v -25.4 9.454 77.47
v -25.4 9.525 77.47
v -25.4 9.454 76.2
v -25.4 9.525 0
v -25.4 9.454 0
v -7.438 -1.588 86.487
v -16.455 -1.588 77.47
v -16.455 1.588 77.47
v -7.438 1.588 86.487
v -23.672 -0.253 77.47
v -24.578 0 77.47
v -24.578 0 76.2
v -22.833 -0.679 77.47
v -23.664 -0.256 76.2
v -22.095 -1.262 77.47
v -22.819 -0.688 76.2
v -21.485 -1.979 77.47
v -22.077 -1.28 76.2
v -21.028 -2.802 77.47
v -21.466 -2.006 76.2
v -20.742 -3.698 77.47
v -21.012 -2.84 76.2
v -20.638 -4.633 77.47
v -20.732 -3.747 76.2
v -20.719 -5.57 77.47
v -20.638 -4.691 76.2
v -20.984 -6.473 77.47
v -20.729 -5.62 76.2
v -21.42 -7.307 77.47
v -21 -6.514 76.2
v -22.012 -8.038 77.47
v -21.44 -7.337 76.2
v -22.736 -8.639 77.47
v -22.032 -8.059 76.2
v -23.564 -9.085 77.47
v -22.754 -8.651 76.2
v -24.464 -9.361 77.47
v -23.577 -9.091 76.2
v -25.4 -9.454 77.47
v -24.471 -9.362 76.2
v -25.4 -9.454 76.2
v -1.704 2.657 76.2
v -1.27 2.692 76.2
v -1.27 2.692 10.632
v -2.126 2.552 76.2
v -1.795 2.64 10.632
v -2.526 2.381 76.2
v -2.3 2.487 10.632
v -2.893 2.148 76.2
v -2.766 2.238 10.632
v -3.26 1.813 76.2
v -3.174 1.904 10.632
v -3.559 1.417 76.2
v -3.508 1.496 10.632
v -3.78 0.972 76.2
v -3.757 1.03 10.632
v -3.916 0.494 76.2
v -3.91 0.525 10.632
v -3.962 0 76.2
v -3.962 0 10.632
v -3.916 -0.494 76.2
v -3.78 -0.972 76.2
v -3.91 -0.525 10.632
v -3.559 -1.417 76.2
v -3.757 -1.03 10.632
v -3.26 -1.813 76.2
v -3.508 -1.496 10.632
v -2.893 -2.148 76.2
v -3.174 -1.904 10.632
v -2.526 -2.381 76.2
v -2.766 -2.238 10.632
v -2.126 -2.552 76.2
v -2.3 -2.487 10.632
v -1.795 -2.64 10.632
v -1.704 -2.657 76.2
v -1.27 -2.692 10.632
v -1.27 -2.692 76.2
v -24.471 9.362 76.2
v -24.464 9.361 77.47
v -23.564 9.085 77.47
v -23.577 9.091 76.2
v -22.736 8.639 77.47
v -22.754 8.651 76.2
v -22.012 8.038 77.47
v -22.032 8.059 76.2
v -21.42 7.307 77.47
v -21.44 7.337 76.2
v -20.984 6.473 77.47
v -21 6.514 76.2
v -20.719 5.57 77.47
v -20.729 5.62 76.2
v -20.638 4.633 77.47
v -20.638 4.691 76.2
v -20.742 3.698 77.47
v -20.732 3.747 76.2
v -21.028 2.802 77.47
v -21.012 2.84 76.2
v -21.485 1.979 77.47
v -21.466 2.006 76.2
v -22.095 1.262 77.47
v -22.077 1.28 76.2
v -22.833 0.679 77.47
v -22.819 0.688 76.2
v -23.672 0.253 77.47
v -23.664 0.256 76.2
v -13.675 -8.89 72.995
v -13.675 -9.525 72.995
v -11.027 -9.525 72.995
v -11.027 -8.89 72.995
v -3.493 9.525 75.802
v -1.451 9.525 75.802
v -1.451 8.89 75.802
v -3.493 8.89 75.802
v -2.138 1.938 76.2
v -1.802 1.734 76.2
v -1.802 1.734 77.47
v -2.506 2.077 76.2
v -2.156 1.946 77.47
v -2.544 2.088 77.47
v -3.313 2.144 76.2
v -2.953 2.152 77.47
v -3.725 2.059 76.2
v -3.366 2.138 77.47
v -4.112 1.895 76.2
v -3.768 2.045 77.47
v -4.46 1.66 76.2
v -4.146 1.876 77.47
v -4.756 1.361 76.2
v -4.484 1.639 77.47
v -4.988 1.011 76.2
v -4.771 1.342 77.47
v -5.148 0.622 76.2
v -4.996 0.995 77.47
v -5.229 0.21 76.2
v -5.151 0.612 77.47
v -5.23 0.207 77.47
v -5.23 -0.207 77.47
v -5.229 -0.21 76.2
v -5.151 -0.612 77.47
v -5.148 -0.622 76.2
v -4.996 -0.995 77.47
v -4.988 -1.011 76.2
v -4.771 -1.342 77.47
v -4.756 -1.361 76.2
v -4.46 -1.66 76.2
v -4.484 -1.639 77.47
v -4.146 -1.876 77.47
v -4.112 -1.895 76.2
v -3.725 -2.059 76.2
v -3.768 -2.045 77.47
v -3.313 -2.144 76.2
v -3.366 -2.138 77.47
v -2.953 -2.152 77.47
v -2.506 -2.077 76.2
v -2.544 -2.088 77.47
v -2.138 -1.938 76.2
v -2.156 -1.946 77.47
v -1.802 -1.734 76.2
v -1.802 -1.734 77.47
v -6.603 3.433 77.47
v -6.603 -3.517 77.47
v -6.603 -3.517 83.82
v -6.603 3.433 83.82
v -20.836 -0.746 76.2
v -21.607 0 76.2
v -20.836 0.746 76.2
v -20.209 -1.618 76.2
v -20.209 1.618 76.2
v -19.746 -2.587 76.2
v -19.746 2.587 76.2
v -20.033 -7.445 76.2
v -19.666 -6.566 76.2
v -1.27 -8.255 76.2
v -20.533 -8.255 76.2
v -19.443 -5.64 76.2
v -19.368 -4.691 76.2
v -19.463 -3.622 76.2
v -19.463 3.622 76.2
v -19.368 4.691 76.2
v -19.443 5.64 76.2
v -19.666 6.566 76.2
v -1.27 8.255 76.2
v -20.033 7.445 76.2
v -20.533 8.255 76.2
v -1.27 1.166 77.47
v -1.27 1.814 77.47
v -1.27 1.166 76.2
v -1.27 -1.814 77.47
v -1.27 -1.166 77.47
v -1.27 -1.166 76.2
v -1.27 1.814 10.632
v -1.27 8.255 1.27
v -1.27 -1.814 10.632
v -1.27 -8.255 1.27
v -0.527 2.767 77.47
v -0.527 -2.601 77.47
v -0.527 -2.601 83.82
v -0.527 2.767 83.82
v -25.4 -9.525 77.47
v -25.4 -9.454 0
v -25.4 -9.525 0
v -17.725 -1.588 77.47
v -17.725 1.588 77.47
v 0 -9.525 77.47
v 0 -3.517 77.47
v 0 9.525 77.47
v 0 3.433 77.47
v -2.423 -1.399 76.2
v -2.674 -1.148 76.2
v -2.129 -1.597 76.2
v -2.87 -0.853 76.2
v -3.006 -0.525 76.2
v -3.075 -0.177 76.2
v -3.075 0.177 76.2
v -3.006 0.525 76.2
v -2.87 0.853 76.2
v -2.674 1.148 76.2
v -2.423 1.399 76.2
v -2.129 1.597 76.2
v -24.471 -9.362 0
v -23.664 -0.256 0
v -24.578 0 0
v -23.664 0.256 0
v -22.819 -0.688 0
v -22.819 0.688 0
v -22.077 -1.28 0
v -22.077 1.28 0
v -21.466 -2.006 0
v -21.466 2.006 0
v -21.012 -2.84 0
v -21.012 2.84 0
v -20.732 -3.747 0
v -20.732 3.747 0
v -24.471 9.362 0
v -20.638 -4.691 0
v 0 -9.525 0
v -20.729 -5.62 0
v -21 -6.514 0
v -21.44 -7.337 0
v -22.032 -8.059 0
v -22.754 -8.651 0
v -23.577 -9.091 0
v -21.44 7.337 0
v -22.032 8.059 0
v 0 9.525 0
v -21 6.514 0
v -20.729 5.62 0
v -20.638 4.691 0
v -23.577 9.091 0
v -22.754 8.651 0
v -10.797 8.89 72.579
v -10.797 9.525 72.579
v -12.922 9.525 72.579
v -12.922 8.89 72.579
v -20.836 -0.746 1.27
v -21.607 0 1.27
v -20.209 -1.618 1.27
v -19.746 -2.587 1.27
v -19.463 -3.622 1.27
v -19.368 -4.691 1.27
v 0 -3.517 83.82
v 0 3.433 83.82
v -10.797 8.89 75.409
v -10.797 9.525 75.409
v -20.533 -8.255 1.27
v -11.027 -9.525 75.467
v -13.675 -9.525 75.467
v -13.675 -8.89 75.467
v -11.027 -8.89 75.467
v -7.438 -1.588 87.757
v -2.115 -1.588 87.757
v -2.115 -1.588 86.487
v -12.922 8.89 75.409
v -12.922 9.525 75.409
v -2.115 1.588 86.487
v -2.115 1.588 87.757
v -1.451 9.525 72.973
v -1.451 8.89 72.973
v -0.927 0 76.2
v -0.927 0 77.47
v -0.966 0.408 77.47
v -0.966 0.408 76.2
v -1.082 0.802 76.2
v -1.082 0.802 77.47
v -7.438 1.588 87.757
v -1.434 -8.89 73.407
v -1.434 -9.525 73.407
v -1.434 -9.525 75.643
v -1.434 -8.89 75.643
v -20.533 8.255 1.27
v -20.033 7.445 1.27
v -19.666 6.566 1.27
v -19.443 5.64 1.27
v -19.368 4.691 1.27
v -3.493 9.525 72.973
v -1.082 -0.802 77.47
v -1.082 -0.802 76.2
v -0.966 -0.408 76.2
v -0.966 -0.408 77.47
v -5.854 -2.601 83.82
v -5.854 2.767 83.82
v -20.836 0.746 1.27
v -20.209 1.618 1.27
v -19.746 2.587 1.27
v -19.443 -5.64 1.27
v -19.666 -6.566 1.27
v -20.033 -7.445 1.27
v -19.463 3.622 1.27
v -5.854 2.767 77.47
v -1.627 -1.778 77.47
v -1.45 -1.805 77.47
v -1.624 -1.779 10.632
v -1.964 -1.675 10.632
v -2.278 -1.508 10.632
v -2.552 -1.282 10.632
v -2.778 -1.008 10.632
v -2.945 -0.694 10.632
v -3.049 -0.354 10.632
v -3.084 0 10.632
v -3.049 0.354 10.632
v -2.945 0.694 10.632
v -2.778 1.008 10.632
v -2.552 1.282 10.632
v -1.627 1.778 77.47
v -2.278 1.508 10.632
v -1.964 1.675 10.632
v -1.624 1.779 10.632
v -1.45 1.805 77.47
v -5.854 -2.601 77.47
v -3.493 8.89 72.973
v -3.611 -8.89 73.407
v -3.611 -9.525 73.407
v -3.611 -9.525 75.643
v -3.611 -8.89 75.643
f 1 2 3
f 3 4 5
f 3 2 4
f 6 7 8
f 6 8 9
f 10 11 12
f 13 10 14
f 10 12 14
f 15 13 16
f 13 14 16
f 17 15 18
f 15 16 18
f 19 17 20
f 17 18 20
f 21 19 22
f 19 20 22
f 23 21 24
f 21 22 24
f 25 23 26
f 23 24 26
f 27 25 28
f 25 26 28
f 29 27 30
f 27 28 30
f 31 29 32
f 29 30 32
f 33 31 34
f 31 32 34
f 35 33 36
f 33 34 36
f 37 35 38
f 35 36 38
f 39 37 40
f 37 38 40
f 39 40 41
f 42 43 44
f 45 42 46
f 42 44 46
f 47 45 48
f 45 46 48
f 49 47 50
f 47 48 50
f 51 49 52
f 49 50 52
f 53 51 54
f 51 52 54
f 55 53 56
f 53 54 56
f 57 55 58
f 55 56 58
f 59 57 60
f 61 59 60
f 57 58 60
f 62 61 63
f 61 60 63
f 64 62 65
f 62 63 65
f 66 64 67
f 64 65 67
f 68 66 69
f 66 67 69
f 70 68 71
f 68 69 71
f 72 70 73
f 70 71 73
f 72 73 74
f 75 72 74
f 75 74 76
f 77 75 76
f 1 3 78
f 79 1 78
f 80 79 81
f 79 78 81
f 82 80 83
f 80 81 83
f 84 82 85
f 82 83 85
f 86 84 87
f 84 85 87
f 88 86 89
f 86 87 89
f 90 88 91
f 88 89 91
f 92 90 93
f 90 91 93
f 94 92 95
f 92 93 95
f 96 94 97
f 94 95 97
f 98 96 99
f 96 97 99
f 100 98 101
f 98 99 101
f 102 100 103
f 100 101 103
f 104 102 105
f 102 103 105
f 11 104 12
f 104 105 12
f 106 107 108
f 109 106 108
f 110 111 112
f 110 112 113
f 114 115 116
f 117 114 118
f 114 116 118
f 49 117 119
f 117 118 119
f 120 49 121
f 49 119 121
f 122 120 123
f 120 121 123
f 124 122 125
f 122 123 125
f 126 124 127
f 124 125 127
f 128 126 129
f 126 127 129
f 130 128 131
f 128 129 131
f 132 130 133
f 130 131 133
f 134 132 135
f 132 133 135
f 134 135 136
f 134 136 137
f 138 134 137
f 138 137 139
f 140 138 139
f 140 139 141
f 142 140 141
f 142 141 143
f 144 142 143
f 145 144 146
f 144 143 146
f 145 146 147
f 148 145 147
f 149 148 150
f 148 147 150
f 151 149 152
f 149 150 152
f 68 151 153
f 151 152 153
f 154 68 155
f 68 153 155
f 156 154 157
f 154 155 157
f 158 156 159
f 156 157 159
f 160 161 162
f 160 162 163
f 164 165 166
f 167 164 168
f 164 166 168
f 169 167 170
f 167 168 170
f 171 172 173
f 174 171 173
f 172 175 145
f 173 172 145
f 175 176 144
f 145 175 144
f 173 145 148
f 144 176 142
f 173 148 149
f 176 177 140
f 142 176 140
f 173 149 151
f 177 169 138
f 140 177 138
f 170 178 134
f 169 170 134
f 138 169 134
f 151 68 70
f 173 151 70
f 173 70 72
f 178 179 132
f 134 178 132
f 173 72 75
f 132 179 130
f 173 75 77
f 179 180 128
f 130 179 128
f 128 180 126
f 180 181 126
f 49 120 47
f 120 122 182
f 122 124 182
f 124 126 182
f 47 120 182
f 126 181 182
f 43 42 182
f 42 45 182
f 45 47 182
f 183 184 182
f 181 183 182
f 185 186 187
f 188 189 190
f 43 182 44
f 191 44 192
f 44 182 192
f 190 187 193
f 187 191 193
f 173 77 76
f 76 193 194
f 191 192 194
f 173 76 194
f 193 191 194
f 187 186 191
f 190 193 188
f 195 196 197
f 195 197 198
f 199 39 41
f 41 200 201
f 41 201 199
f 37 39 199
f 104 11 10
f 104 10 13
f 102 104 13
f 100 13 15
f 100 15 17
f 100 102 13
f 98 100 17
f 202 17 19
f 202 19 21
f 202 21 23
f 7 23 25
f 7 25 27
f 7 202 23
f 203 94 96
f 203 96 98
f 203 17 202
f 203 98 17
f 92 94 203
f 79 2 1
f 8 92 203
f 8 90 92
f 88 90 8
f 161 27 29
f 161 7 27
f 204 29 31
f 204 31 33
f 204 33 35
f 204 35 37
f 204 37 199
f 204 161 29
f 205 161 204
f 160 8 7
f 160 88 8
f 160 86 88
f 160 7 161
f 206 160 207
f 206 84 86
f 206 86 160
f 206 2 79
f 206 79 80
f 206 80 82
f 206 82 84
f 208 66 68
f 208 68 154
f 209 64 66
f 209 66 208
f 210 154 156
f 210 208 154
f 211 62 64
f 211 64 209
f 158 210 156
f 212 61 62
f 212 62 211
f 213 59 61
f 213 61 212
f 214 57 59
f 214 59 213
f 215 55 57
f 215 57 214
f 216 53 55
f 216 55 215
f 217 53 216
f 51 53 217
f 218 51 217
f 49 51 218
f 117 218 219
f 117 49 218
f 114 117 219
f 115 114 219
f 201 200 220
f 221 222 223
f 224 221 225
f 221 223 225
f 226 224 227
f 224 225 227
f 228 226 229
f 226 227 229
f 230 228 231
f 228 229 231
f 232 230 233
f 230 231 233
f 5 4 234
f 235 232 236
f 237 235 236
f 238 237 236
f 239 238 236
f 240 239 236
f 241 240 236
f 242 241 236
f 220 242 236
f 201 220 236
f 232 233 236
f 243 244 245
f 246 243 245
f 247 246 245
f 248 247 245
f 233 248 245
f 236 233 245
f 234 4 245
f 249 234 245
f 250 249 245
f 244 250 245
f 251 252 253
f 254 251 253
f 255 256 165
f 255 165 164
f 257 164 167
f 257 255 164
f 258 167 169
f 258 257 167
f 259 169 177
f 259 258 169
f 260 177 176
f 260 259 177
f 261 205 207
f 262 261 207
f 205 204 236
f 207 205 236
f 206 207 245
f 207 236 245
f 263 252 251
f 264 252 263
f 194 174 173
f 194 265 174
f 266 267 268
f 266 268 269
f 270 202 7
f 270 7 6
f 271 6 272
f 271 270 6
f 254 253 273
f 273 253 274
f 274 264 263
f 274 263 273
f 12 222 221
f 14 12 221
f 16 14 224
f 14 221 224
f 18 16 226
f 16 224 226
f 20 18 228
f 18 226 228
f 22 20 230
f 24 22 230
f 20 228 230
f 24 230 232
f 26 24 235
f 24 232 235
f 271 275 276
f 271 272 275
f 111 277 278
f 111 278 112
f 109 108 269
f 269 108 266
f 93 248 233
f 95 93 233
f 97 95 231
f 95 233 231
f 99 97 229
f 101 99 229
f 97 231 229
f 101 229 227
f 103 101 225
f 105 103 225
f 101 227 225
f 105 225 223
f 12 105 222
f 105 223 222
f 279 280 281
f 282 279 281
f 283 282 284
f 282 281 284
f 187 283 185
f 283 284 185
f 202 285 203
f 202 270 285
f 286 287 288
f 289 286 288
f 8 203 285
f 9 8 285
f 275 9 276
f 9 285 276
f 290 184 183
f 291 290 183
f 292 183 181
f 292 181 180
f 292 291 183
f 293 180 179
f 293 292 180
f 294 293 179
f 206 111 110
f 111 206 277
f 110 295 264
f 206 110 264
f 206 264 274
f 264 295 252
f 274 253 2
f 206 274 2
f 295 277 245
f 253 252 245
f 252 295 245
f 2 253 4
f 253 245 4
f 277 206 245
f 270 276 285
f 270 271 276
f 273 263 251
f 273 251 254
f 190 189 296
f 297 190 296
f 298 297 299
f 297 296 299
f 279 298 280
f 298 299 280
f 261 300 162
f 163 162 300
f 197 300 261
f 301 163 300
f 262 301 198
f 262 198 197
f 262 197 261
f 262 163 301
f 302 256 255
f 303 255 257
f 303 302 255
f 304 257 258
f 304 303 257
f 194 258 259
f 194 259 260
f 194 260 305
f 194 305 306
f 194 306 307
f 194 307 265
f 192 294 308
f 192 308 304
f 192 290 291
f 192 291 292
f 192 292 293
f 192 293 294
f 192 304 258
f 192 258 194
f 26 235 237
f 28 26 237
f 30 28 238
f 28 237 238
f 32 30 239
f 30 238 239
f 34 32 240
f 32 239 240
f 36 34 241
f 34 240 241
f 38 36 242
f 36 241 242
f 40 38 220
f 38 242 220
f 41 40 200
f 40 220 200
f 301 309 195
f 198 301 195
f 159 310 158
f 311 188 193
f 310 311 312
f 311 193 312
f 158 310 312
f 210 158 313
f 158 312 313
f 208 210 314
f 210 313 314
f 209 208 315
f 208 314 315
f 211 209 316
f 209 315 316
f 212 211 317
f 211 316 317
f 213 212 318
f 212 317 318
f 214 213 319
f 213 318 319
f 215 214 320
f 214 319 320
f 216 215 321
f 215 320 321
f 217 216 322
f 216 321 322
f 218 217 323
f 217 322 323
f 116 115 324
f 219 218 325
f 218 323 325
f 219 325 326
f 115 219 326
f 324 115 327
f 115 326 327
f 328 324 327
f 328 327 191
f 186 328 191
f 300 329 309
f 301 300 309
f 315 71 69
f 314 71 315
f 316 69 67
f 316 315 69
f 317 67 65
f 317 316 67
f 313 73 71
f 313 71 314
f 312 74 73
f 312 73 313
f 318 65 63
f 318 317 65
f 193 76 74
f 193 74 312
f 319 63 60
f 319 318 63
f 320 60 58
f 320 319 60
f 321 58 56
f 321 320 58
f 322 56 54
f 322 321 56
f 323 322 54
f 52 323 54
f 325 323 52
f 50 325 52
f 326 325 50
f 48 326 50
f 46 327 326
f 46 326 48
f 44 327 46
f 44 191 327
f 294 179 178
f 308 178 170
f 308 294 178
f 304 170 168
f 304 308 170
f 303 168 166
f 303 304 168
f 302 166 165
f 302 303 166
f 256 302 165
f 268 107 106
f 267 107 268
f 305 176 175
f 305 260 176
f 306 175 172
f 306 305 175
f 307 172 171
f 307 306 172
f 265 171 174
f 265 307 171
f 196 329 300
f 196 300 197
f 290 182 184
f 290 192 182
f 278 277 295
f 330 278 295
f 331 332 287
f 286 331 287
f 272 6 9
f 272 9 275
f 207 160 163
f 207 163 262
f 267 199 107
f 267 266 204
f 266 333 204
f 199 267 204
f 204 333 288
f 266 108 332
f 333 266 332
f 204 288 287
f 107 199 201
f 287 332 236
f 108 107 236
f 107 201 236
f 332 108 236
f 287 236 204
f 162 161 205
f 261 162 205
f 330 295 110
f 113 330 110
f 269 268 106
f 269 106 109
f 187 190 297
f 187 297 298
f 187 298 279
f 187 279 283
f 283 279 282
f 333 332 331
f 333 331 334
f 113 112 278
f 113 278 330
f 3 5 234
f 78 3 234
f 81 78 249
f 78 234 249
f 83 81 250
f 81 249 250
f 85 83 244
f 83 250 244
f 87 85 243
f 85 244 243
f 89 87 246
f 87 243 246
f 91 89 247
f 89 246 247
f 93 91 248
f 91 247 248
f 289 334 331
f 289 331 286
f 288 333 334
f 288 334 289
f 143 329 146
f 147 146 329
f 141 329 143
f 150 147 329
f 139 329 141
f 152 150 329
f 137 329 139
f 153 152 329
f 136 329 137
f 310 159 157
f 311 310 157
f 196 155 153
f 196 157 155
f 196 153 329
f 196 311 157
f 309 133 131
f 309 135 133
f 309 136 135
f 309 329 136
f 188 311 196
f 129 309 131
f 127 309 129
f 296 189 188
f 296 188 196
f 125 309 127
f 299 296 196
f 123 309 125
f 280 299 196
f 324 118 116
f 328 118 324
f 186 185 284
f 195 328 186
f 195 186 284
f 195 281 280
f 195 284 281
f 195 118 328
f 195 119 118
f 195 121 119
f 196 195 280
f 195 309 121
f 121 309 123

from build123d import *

# Parameters (mm, degrees)
F1_DEPTH  = 76.2
F2_T      = -1.27
F4_DEPTH  = 76.2
F6_DEPTH  = 12.7
F8_DEPTH  = 1.27
F10_DEPTH = 1.27
F12_DEPTH = 1.5875
F13_W     = 6.6033280455
F13_H     = 6.9497893564
F13_W_2   = 5.3267844487
F13_H_2   = 5.3683998995
F14_DEPTH = 6.35
F15_W     = 2.0411710721
F15_H     = 2.829067409
F15_W_2   = 2.1245945245
F15_H_2   = 2.8308555484
F16_DEPTH = 0.635
F17_W     = 2.6483945549
F17_H     = 2.4718344212
F17_W_2   = 2.1775695495
F17_H_2   = 2.236418426
F18_DEPTH = 0.635


# Not quite as in the source:
# - a feature names something its author has since deleted; it is built from what else it names


with BuildPart() as f1:
    # F0 (on Top) → F1 (new body)
    with BuildSketch(Plane.XY):
        with BuildLine():
            Line((0, -9.525), (0, 9.525))
            Line((0, 9.525), (-25.4, 9.525))
            Line((-25.4, 9.525), (-25.4, 9.4535289675))
            ThreePointArc((-25.4, 9.4535289675), (-22.0324039546, 8.0586250129), (-20.6375, 4.6910289675))
            ThreePointArc((-20.6375, 4.6910289675), (-21.7533513451, 1.6278019374), (-24.5780185671, 0))
            ThreePointArc((-24.5780185671, 0), (-21.7533513451, -1.6278019374), (-20.6375, -4.6910289675))
            ThreePointArc((-20.6375, -4.6910289675), (-22.0324039546, -8.0586250129), (-25.4, -9.4535289675))
            Line((-25.4, -9.4535289675), (-25.4, -9.525))
            Line((-25.4, -9.525), (0, -9.525))
        make_face()
    extrude(amount=F1_DEPTH)

    # F2
    f2_openings = [f1.faces().sort_by_distance(p)[0] for p in [
        (-10.85856, 0, 76.2),
    ]]
    offset(amount=F2_T, openings=f2_openings)

    # F3 (on Top) → F4 (join)
    with BuildSketch(Plane.XY):
        with BuildLine():
            Line((-1.27, 1.8135049587), (-1.27, 2.6920572227))
            ThreePointArc((-1.27, 2.6920572227), (-3.9620572227, 0), (-1.27, -2.6920572227))
            Line((-1.27, -2.6920572227), (-1.27, -1.8135049587))
            ThreePointArc((-1.27, -1.8135049587), (-3.0835049587, 0), (-1.27, 1.8135049587))
        make_face()
    extrude(amount=F4_DEPTH)

    # F5 (on face) → F6 (cut)
    with BuildSketch(Plane(origin=(-1.27, 0, 0), x_dir=(0, -1, 0), z_dir=(-1, 0, 0))):
        Polygon((-2.6920572227, 1.27), (2.6920572227, 1.27), (2.6920572227, 10.6323556975), (-3.4403376048, 10.6323556975), (-3.4403376048, 1.27), align=None)
    extrude(amount=F6_DEPTH, mode=Mode.SUBTRACT)

    # F7 (on face) → F8 (join)
    with BuildSketch(Plane.XY.offset(76.2)):
        with BuildLine():
            Line((0, -9.525), (0, 9.525))
            Line((0, 9.525), (-25.4, 9.525))
            Line((-25.4, 9.525), (-25.4, 9.4535289675))
            ThreePointArc((-25.4, 9.4535289675), (-20.6554014022, 5.1035703547), (-24.5780185671, 0))
            ThreePointArc((-24.5780185671, 0), (-20.6554014022, -5.1035703547), (-25.4, -9.4535289675))
            Line((-25.4, -9.4535289675), (-25.4, -9.525))
            Line((-25.4, -9.525), (0, -9.525))
        make_face()
        with BuildLine():
            ThreePointArc((-1.27, 2.6920572227), (-3.9620572227, 0), (-1.27, -2.6920572227))
            Line((-1.27, -2.6920572227), (-1.27, -8.255))
            Line((-1.27, -8.255), (-20.5328481912, -8.255))
            ThreePointArc((-20.5328481912, -8.255), (-19.4179492319, -3.9124887578), (-21.6072037392, 0))
            ThreePointArc((-21.6072037392, 0), (-19.4179492319, 3.9124887578), (-20.5328481912, 8.255))
            Line((-20.5328481912, 8.255), (-1.27, 8.255))
            Line((-1.27, 8.255), (-1.27, 2.6920572227))
        make_face(mode=Mode.SUBTRACT)
        with BuildLine():
            ThreePointArc((-1.27, -1.8135049587), (-3.0835049587, 0), (-1.27, 1.8135049587))
            Line((-1.27, 1.8135049587), (-1.27, -1.8135049587))
        make_face(mode=Mode.SUBTRACT)
        with BuildLine():
            Line((-1.27, -8.255), (-1.27, -2.6920572227))
            ThreePointArc((-1.27, -2.6920572227), (-3.9620572227, 0), (-1.27, 2.6920572227))
            Line((-1.27, 2.6920572227), (-1.27, 8.255))
            Line((-1.27, 8.255), (-20.5328481912, 8.255))
            ThreePointArc((-20.5328481912, 8.255), (-19.4179492319, 3.9124887578), (-21.6072037392, 0))
            ThreePointArc((-21.6072037392, 0), (-19.4179492319, -3.9124887578), (-20.5328481912, -8.255))
            Line((-20.5328481912, -8.255), (-1.27, -8.255))
        make_face()
    extrude(amount=F8_DEPTH)

    # F9 (on face) → F10 (cut)
    with BuildSketch(Plane.XY.offset(77.47)):
        with BuildLine():
            ThreePointArc((-1.8017621012, -1.7337904437), (-3.0835049587, 0), (-1.8017621012, 1.7337904437))
            ThreePointArc((-1.8017621012, 1.7337904437), (-5.239634374, 0), (-1.8017621012, -1.7337904437))
        make_face()
        with BuildLine():
            ThreePointArc((-1.27, -1.1662306034), (-1.0148042261, -0.6077592736), (-0.9273755434, 0))
            ThreePointArc((-0.9273755434, 0), (-1.0148042261, 0.6077592736), (-1.27, 1.1662306034))
            Line((-1.27, 1.1662306034), (-1.27, -1.1662306034))
        make_face()
        with BuildLine():
            Line((-1.27, -1.1662306034), (-1.27, 1.1662306034))
            ThreePointArc((-1.27, 1.1662306034), (-1.5100785054, 1.4741856232), (-1.8017621012, 1.7337904437))
            ThreePointArc((-1.8017621012, 1.7337904437), (-3.0835049587, 0), (-1.8017621012, -1.7337904437))
            ThreePointArc((-1.8017621012, -1.7337904437), (-1.5100785054, -1.4741856232), (-1.27, -1.1662306034))
        make_face()
    extrude(amount=-F10_DEPTH, mode=Mode.SUBTRACT)

    # F11 (on Front) → F12 (join, symmetric)
    with BuildSketch(Plane.XZ):
        Polygon((-7.4378219433, 87.7572894096), (-17.725111353, 77.47), (-16.455111353, 77.47), (-7.4378219433, 86.4872894096), (-2.1149073727, 86.4872894096), (-2.1149073727, 87.7572894096), align=None)
    extrude(amount=F12_DEPTH, both=True)

    # F13 (on face) → F14 (join)
    with BuildSketch(Plane.XY.offset(77.47)):
        with Locations((-3.3016640227, -0.0416187104)):
            Rectangle(F13_W, F13_H)
        with Locations((-3.1908567762, 0.0832278747)):
            Rectangle(F13_W_2, F13_H_2, mode=Mode.SUBTRACT)
    extrude(amount=F14_DEPTH)

    # F15 (on face) → F16 (cut)
    with BuildSketch(Plane(origin=(0, 9.525, 0), x_dir=(-1, 0, 0), z_dir=(0, 1, 0))):
        with Locations((2.4719407083, 74.3873603642)):
            Rectangle(F15_W, F15_H)
        with Locations((11.8596078828, 73.9940367639)):
            Rectangle(F15_W_2, F15_H_2)
    extrude(amount=-F16_DEPTH, mode=Mode.SUBTRACT)

    # F17 (on face) → F18 (cut)
    with BuildSketch(Plane.XZ.offset(9.525)):
        with Locations((-12.3509913683, 74.2306262255)):
            Rectangle(F17_W, F17_H)
        with Locations((-2.5225046556, 74.5248906314)):
            Rectangle(F17_W_2, F17_H_2)
    extrude(amount=-F18_DEPTH, mode=Mode.SUBTRACT)


solid = f1.part
